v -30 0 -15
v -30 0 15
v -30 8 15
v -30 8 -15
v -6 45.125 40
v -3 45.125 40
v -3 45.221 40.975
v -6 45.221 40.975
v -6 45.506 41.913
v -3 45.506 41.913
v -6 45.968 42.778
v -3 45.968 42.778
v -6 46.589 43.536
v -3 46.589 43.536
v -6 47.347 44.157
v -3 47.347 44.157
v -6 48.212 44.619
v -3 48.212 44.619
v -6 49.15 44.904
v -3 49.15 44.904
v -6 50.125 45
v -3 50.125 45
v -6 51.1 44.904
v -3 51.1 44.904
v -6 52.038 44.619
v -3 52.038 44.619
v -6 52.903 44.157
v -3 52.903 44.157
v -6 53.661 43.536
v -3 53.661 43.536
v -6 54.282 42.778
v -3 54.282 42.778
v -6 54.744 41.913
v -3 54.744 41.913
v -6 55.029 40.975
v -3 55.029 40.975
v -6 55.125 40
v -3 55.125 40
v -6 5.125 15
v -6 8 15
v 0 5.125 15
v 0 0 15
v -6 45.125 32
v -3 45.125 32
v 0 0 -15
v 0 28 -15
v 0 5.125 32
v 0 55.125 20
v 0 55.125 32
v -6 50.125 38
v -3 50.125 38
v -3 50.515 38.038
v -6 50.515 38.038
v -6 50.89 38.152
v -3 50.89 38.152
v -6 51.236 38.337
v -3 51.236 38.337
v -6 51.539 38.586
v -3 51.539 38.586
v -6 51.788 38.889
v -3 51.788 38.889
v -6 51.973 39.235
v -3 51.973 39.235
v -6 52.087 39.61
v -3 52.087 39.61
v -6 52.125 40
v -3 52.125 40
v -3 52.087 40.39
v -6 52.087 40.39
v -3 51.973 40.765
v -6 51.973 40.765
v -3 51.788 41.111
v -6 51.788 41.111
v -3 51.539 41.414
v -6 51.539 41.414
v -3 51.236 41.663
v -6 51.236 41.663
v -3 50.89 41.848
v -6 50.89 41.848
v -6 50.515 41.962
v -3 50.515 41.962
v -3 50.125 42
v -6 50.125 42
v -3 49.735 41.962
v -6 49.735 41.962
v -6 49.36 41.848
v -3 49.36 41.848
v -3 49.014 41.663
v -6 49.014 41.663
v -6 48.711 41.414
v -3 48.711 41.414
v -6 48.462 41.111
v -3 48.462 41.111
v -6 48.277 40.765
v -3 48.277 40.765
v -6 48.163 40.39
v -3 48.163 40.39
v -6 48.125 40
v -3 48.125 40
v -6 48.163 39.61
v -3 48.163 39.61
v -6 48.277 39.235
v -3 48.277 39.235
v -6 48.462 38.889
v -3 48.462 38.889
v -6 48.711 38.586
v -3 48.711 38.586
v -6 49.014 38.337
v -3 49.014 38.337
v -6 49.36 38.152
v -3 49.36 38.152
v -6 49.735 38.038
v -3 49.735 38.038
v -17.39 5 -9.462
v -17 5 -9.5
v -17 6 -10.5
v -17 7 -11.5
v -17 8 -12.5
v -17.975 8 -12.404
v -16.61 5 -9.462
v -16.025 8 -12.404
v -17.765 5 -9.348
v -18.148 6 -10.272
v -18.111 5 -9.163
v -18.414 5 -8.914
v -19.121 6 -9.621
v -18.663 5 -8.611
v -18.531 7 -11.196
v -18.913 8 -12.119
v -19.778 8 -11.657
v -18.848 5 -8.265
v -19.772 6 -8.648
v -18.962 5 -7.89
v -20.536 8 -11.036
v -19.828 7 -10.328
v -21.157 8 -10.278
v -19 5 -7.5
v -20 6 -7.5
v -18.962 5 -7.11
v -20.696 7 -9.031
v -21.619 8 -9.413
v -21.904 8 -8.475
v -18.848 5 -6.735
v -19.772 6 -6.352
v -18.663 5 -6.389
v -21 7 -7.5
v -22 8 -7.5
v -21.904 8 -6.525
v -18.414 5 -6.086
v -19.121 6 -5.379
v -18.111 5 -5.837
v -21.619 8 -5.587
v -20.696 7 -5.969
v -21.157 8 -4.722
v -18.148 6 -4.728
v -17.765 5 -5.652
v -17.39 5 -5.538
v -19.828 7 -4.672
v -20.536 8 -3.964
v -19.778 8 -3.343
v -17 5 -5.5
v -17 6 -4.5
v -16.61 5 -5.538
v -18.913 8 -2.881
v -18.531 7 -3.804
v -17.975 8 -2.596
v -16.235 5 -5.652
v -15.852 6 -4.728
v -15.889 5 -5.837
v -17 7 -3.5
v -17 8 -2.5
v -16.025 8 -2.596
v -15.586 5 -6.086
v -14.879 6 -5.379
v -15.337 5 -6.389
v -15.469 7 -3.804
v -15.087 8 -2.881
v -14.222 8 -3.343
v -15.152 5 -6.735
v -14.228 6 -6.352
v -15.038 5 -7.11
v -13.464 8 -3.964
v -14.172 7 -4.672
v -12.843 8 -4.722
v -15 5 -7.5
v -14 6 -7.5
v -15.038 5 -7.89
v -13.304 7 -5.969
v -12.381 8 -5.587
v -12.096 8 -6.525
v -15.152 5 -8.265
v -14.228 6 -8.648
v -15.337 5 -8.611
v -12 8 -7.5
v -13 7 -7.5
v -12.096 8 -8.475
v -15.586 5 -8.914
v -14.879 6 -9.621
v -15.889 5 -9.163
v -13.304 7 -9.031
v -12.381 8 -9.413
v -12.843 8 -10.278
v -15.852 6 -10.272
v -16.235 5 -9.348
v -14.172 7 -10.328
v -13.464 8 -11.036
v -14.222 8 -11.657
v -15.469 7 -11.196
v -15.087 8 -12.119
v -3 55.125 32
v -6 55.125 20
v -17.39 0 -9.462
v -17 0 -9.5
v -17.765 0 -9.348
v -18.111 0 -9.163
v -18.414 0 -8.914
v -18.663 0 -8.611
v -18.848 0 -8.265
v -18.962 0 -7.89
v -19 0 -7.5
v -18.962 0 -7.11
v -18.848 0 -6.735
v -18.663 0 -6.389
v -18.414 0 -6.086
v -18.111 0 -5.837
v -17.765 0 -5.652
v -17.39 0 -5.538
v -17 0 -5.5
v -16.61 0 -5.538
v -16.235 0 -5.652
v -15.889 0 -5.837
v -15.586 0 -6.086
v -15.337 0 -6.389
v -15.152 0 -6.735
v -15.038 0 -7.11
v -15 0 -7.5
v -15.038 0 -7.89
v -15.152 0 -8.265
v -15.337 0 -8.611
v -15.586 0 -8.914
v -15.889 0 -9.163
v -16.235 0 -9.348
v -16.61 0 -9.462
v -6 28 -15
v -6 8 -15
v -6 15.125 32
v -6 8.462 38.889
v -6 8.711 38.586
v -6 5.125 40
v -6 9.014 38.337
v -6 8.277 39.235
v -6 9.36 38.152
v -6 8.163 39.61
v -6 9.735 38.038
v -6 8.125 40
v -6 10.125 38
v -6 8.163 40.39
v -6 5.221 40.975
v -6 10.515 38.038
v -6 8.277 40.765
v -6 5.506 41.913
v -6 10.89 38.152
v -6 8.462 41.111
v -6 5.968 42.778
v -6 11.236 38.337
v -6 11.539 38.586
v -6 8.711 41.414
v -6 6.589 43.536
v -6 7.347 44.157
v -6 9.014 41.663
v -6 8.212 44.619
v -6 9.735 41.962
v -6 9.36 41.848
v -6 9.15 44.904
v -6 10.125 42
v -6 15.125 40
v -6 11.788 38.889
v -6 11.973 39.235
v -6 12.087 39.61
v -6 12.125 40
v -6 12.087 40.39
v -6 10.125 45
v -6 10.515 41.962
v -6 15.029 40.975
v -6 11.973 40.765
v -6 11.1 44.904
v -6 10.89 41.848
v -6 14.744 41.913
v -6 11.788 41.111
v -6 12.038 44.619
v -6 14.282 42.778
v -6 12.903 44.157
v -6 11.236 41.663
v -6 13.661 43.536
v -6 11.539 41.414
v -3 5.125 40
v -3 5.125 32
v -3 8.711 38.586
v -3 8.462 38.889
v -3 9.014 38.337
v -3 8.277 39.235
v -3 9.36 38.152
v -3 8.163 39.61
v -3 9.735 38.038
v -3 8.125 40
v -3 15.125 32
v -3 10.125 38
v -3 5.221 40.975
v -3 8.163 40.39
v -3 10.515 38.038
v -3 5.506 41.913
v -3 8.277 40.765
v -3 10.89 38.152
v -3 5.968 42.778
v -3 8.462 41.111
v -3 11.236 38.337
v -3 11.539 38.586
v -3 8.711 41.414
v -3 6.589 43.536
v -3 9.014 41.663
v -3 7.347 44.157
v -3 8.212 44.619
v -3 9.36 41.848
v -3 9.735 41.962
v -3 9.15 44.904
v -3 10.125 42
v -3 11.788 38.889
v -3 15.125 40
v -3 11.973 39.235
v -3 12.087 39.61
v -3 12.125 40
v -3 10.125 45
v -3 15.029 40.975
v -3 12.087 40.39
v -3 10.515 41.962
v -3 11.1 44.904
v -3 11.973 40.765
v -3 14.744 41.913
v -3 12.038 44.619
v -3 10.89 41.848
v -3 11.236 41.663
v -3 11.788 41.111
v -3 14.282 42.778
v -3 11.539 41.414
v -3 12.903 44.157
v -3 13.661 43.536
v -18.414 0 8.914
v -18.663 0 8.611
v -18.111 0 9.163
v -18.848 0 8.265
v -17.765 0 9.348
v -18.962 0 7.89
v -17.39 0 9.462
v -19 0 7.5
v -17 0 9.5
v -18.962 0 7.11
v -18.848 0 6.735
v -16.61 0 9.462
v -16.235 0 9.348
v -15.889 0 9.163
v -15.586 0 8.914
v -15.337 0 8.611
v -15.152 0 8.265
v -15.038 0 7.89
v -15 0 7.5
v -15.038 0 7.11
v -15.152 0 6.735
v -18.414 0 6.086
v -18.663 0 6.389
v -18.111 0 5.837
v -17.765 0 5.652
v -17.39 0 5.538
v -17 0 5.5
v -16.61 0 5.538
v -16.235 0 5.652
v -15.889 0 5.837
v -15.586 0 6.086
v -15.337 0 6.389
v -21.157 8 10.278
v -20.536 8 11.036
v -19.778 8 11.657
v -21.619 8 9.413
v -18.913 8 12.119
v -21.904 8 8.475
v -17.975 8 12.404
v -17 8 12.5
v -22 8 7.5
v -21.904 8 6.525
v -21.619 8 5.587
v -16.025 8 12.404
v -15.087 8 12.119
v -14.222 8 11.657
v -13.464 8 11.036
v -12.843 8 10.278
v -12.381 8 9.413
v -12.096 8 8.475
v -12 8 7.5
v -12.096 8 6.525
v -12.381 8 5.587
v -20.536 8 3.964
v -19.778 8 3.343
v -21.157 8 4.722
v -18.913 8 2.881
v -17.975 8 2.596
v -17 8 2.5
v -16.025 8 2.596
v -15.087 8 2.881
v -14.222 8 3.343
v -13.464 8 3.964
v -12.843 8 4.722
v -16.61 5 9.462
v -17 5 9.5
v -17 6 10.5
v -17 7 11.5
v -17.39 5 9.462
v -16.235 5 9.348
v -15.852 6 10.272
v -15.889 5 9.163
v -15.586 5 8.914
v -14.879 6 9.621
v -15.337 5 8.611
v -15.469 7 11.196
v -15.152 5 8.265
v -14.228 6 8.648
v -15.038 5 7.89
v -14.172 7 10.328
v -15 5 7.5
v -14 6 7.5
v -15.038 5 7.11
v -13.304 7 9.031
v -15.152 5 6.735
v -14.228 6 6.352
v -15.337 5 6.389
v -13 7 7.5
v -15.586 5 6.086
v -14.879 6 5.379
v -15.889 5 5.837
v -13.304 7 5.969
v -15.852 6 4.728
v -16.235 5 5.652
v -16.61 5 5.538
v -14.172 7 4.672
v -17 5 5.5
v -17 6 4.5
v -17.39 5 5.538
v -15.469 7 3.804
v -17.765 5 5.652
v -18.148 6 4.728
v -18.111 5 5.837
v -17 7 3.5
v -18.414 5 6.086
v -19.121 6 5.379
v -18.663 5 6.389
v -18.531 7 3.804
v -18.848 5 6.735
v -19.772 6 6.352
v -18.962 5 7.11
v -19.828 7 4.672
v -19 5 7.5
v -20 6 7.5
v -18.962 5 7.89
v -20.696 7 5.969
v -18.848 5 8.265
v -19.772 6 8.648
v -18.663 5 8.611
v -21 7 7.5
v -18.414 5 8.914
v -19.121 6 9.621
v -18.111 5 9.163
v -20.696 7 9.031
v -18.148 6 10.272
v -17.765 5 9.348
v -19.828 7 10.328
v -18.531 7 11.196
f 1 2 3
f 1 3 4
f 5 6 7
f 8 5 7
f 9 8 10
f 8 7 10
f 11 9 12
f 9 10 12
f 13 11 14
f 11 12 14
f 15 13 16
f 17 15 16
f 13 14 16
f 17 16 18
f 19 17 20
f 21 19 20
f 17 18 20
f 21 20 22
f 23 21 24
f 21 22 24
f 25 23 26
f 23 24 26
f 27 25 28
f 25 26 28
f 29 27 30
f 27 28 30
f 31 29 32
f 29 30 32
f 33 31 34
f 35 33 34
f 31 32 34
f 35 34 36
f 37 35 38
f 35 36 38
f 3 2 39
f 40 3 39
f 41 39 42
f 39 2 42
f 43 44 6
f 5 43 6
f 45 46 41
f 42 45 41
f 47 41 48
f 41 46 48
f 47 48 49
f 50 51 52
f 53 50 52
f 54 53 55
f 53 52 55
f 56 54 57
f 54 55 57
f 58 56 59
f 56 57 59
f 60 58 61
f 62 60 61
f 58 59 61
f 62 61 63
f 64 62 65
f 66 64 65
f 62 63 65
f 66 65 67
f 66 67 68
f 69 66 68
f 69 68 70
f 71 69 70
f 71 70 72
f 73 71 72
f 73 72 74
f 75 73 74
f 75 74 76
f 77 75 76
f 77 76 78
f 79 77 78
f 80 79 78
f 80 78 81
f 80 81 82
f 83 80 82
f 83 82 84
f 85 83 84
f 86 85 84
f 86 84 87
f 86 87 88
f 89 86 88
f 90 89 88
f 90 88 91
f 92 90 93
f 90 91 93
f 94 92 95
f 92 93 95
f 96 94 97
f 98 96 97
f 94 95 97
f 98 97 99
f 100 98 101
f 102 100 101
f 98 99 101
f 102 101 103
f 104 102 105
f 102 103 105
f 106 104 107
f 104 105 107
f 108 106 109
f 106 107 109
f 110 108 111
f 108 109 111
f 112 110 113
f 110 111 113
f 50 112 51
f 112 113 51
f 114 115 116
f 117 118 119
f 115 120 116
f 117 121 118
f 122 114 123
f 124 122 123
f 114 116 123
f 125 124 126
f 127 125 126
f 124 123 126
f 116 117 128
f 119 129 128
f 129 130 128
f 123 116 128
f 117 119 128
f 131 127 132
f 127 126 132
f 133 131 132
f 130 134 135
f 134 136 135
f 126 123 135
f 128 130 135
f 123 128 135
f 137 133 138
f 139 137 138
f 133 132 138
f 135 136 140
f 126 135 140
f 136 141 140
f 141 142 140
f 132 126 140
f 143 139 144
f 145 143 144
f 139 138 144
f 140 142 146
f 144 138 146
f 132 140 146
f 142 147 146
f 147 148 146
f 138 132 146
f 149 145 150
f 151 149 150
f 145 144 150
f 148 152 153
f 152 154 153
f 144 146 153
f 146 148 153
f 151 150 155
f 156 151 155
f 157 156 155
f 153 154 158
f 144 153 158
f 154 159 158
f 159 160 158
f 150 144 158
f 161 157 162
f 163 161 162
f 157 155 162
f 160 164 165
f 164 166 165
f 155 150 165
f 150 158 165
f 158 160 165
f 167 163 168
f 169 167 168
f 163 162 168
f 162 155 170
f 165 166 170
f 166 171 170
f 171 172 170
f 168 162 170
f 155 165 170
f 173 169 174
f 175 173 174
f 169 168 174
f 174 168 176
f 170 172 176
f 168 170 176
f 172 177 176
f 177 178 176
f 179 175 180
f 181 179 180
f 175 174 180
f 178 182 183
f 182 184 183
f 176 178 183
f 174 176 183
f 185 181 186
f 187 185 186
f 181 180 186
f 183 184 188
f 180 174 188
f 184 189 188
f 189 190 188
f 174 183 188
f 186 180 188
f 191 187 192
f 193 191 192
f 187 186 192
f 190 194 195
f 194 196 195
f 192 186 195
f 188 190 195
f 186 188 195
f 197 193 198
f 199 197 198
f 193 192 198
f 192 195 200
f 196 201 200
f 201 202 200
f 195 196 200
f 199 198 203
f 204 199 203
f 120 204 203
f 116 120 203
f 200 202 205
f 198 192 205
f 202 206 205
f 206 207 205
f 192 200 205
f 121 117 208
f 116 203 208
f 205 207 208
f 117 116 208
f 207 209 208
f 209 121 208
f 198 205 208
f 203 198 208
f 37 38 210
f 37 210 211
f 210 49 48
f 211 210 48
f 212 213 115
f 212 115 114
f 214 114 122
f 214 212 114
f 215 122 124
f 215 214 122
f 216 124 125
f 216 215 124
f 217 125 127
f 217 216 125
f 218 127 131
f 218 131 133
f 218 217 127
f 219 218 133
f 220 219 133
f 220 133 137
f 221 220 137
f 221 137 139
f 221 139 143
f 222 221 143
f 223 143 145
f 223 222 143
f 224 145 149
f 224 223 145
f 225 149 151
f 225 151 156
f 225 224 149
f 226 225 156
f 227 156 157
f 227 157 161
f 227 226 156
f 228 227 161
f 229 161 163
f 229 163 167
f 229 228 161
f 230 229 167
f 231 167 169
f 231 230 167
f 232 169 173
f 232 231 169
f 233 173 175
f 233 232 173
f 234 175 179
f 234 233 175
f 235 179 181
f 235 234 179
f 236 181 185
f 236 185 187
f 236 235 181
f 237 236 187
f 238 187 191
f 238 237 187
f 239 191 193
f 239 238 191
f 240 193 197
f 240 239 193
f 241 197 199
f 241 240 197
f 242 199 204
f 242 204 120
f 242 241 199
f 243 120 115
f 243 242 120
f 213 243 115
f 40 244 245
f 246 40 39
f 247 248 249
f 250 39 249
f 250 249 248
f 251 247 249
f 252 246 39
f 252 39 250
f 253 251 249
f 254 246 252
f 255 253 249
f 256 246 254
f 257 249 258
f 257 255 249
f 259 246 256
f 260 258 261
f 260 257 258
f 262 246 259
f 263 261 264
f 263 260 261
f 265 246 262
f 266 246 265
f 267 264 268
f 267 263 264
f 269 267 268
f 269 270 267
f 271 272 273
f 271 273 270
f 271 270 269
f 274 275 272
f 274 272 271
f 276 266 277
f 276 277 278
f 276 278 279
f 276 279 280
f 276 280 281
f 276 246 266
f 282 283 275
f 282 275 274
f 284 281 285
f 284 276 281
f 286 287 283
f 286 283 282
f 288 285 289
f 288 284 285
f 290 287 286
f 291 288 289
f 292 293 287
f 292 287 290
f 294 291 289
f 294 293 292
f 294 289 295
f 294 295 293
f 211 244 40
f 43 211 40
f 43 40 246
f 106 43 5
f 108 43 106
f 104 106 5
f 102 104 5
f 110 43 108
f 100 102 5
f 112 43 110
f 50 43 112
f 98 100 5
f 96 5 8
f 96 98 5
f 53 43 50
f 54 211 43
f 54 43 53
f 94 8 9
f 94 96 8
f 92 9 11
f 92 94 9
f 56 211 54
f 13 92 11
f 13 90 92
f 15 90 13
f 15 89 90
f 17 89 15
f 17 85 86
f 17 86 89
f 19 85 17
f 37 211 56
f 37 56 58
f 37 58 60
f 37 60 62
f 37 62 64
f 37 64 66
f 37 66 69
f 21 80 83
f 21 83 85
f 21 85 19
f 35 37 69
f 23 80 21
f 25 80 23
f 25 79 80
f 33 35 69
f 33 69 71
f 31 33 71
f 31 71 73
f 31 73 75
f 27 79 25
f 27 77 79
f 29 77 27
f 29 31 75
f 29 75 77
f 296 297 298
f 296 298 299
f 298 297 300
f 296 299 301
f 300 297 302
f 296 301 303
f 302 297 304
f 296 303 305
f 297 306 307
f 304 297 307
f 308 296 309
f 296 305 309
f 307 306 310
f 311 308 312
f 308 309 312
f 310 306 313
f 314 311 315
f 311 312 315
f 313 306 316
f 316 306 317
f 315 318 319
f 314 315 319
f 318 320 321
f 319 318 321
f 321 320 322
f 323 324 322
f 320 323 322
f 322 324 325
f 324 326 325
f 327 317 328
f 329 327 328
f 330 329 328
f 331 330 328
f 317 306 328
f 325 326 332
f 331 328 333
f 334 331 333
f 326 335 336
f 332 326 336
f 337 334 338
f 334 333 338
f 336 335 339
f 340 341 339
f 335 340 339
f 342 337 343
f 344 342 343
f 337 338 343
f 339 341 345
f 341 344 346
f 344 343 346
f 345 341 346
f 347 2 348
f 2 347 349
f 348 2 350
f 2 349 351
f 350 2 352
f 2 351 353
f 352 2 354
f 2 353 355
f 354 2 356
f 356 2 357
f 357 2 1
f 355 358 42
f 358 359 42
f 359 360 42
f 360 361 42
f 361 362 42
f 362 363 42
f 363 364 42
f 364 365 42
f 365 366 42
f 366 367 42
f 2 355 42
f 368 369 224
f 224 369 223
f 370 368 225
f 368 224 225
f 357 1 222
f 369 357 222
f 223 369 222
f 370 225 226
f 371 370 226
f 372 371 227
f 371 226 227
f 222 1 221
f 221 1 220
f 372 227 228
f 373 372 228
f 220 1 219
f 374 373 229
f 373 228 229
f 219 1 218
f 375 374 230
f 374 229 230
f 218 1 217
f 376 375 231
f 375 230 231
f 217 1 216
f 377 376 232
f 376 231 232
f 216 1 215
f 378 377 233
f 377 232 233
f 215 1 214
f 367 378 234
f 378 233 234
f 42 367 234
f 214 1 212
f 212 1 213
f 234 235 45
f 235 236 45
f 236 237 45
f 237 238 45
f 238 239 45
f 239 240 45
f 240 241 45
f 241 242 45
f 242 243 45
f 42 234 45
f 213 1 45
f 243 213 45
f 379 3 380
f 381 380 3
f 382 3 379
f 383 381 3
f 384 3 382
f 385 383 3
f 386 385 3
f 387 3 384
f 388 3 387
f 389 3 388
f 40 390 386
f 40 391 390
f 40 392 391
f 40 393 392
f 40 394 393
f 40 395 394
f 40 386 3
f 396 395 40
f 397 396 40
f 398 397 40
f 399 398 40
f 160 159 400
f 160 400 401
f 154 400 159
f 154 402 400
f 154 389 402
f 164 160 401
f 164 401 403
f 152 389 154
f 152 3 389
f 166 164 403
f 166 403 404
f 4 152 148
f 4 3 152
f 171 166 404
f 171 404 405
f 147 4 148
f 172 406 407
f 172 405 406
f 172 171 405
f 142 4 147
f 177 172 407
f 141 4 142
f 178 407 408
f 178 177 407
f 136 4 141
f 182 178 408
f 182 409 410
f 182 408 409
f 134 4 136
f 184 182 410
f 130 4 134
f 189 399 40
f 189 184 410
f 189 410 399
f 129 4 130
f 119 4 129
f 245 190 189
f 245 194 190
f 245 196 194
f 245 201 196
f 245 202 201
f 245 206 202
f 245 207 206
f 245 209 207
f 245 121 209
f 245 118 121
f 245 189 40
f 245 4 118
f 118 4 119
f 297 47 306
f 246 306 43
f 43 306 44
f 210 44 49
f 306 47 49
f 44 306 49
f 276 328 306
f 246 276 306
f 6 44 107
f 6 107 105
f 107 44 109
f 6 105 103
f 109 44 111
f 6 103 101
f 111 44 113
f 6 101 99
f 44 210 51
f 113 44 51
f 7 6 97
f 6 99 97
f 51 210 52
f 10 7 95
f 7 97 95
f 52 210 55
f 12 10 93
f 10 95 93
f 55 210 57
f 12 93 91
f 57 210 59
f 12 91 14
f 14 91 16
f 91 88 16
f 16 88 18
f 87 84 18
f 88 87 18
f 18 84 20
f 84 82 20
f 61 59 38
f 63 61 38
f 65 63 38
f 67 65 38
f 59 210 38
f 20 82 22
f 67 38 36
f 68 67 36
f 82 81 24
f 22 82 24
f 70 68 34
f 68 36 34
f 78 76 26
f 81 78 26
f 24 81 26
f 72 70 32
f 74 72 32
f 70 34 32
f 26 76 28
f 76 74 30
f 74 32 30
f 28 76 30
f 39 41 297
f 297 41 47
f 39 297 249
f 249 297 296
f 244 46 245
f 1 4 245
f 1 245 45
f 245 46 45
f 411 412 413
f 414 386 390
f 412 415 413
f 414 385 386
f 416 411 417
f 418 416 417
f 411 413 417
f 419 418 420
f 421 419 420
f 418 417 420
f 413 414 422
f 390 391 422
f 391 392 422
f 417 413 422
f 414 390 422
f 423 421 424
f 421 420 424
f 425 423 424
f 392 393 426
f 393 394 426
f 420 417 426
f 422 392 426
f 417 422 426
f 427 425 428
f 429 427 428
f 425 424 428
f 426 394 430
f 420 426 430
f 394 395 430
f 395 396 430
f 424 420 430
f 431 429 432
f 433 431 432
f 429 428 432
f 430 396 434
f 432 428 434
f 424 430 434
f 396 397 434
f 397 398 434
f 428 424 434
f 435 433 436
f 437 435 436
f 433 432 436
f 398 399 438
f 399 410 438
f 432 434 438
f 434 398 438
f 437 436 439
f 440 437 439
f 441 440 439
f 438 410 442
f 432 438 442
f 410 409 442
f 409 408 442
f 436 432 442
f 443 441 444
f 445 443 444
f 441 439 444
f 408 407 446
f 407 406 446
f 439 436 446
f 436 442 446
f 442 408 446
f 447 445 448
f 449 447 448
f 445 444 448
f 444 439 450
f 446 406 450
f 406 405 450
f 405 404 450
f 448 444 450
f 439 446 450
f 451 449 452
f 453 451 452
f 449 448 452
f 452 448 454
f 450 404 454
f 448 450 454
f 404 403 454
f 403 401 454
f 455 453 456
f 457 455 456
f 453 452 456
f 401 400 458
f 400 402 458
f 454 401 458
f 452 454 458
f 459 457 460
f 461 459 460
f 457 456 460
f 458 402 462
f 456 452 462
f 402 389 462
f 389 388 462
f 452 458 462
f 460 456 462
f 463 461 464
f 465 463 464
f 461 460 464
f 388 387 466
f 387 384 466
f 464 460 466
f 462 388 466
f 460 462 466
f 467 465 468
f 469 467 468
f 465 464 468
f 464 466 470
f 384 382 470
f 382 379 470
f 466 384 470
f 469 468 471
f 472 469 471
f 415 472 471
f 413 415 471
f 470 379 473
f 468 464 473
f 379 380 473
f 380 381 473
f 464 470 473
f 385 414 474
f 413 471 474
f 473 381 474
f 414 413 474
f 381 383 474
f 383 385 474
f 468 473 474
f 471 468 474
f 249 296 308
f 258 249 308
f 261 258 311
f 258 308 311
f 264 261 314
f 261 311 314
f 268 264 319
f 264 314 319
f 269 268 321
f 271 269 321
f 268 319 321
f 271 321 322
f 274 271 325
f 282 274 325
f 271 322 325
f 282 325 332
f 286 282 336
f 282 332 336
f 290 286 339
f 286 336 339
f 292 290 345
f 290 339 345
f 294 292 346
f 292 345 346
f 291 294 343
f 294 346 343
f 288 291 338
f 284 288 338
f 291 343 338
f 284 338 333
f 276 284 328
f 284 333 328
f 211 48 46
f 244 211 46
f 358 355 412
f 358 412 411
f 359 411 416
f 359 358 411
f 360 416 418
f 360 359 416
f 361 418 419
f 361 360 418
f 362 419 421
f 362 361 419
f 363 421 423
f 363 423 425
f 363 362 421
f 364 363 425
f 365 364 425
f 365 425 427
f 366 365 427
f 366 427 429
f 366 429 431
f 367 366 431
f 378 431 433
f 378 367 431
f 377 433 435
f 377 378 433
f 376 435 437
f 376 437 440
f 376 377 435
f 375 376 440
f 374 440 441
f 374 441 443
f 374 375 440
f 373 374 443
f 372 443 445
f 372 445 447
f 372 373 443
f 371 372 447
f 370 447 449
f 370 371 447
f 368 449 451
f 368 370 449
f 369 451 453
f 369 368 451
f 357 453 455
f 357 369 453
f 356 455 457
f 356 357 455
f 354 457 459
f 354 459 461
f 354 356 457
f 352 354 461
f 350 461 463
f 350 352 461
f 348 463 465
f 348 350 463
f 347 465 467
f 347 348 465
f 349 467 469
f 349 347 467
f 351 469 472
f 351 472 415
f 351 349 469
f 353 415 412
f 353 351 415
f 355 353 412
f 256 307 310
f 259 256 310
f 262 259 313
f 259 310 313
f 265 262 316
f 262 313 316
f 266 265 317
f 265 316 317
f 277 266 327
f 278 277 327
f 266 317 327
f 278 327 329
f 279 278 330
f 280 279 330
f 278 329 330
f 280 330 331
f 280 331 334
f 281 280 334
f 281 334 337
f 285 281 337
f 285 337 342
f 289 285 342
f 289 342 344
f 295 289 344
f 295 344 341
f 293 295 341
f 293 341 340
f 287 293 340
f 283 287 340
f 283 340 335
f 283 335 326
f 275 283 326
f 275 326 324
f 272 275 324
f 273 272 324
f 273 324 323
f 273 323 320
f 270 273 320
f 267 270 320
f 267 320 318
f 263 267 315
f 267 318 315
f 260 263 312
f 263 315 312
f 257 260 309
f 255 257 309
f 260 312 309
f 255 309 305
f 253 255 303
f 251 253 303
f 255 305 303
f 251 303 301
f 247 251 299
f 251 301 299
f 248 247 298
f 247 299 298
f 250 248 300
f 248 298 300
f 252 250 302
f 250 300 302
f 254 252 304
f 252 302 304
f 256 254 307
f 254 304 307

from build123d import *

# Parameters (mm, degrees)
SKETCH_1_W          = 30
SKETCH_1_H          = 30
SKETCH_1_R          = 2
EXTRUDE_1_DEPTH     = 8
SKETCH_3_R          = 2
EXTRUDE_2_DEPTH     = 6
CHAMFER_1_SIZE      = 3
CUT_EXTRUDE_START   = -6
SKETCH_4_W          = 13
SKETCH_4_H          = 50
CUT_EXTRUDE_1_DEPTH = 3


with BuildPart() as part:
    # 草图1 → 凸台-拉伸1 (new body)
    with BuildSketch(Plane(origin=(0, 0, 0), x_dir=(1, 0, 0), z_dir=(0, 1, 0))):
        with Locations((-15, 0)):
            Rectangle(SKETCH_1_W, SKETCH_1_H)
        with Locations(Location((-17, 7.5, 0), (0, 0, 90))):
            Circle(SKETCH_1_R, mode=Mode.SUBTRACT)
        with Locations(Location((-17, -7.5, 0), (0, 0, 270))):
            Circle(SKETCH_1_R, mode=Mode.SUBTRACT)
    extrude(amount=EXTRUDE_1_DEPTH)

    # 草图3 → 凸台-拉伸2 (add)
    with BuildSketch(Plane(origin=(0, 0, 0), x_dir=(0, 0, -1), z_dir=(1, 0, 0))):
        with BuildLine():
            Line((-15, 8), (-15, 5.125))
            Line((-15, 5.125), (-40, 5.125))
            ThreePointArc((-40, 5.125), (-45, 10.125), (-40, 15.125))
            Line((-40, 15.125), (-32, 15.125))
            Line((-32, 15.125), (-32, 45.125))
            Line((-32, 45.125), (-40, 45.125))
            ThreePointArc((-40, 45.125), (-45, 50.125), (-40, 55.125))
            Line((-40, 55.125), (-20, 55.125))
            Line((-20, 55.125), (15, 28))
            Line((15, 28), (15, 8))
            Line((15, 8), (-15, 8))
        make_face()
        with Locations((-40, 10.125)):
            Circle(SKETCH_3_R, mode=Mode.SUBTRACT)
        with Locations((-40, 50.125)):
            Circle(SKETCH_3_R, mode=Mode.SUBTRACT)
    extrude(amount=-EXTRUDE_2_DEPTH)

    # 倒角1
    chamfer_1_edges = [part.edges().sort_by_distance(p)[0] for p in [
        (-17, 8, -5.5),
        (-17, 8, 5.5),
    ]]
    chamfer(chamfer_1_edges, length=CHAMFER_1_SIZE)

    # 草图4 → 切除-拉伸1 (cut)
    with BuildSketch(Plane.ZY.offset(6).offset(CUT_EXTRUDE_START)):
        with Locations((38.5, 30.125)):
            Rectangle(SKETCH_4_W, SKETCH_4_H)
    extrude(amount=CUT_EXTRUDE_1_DEPTH, mode=Mode.SUBTRACT)


solid = part.part
